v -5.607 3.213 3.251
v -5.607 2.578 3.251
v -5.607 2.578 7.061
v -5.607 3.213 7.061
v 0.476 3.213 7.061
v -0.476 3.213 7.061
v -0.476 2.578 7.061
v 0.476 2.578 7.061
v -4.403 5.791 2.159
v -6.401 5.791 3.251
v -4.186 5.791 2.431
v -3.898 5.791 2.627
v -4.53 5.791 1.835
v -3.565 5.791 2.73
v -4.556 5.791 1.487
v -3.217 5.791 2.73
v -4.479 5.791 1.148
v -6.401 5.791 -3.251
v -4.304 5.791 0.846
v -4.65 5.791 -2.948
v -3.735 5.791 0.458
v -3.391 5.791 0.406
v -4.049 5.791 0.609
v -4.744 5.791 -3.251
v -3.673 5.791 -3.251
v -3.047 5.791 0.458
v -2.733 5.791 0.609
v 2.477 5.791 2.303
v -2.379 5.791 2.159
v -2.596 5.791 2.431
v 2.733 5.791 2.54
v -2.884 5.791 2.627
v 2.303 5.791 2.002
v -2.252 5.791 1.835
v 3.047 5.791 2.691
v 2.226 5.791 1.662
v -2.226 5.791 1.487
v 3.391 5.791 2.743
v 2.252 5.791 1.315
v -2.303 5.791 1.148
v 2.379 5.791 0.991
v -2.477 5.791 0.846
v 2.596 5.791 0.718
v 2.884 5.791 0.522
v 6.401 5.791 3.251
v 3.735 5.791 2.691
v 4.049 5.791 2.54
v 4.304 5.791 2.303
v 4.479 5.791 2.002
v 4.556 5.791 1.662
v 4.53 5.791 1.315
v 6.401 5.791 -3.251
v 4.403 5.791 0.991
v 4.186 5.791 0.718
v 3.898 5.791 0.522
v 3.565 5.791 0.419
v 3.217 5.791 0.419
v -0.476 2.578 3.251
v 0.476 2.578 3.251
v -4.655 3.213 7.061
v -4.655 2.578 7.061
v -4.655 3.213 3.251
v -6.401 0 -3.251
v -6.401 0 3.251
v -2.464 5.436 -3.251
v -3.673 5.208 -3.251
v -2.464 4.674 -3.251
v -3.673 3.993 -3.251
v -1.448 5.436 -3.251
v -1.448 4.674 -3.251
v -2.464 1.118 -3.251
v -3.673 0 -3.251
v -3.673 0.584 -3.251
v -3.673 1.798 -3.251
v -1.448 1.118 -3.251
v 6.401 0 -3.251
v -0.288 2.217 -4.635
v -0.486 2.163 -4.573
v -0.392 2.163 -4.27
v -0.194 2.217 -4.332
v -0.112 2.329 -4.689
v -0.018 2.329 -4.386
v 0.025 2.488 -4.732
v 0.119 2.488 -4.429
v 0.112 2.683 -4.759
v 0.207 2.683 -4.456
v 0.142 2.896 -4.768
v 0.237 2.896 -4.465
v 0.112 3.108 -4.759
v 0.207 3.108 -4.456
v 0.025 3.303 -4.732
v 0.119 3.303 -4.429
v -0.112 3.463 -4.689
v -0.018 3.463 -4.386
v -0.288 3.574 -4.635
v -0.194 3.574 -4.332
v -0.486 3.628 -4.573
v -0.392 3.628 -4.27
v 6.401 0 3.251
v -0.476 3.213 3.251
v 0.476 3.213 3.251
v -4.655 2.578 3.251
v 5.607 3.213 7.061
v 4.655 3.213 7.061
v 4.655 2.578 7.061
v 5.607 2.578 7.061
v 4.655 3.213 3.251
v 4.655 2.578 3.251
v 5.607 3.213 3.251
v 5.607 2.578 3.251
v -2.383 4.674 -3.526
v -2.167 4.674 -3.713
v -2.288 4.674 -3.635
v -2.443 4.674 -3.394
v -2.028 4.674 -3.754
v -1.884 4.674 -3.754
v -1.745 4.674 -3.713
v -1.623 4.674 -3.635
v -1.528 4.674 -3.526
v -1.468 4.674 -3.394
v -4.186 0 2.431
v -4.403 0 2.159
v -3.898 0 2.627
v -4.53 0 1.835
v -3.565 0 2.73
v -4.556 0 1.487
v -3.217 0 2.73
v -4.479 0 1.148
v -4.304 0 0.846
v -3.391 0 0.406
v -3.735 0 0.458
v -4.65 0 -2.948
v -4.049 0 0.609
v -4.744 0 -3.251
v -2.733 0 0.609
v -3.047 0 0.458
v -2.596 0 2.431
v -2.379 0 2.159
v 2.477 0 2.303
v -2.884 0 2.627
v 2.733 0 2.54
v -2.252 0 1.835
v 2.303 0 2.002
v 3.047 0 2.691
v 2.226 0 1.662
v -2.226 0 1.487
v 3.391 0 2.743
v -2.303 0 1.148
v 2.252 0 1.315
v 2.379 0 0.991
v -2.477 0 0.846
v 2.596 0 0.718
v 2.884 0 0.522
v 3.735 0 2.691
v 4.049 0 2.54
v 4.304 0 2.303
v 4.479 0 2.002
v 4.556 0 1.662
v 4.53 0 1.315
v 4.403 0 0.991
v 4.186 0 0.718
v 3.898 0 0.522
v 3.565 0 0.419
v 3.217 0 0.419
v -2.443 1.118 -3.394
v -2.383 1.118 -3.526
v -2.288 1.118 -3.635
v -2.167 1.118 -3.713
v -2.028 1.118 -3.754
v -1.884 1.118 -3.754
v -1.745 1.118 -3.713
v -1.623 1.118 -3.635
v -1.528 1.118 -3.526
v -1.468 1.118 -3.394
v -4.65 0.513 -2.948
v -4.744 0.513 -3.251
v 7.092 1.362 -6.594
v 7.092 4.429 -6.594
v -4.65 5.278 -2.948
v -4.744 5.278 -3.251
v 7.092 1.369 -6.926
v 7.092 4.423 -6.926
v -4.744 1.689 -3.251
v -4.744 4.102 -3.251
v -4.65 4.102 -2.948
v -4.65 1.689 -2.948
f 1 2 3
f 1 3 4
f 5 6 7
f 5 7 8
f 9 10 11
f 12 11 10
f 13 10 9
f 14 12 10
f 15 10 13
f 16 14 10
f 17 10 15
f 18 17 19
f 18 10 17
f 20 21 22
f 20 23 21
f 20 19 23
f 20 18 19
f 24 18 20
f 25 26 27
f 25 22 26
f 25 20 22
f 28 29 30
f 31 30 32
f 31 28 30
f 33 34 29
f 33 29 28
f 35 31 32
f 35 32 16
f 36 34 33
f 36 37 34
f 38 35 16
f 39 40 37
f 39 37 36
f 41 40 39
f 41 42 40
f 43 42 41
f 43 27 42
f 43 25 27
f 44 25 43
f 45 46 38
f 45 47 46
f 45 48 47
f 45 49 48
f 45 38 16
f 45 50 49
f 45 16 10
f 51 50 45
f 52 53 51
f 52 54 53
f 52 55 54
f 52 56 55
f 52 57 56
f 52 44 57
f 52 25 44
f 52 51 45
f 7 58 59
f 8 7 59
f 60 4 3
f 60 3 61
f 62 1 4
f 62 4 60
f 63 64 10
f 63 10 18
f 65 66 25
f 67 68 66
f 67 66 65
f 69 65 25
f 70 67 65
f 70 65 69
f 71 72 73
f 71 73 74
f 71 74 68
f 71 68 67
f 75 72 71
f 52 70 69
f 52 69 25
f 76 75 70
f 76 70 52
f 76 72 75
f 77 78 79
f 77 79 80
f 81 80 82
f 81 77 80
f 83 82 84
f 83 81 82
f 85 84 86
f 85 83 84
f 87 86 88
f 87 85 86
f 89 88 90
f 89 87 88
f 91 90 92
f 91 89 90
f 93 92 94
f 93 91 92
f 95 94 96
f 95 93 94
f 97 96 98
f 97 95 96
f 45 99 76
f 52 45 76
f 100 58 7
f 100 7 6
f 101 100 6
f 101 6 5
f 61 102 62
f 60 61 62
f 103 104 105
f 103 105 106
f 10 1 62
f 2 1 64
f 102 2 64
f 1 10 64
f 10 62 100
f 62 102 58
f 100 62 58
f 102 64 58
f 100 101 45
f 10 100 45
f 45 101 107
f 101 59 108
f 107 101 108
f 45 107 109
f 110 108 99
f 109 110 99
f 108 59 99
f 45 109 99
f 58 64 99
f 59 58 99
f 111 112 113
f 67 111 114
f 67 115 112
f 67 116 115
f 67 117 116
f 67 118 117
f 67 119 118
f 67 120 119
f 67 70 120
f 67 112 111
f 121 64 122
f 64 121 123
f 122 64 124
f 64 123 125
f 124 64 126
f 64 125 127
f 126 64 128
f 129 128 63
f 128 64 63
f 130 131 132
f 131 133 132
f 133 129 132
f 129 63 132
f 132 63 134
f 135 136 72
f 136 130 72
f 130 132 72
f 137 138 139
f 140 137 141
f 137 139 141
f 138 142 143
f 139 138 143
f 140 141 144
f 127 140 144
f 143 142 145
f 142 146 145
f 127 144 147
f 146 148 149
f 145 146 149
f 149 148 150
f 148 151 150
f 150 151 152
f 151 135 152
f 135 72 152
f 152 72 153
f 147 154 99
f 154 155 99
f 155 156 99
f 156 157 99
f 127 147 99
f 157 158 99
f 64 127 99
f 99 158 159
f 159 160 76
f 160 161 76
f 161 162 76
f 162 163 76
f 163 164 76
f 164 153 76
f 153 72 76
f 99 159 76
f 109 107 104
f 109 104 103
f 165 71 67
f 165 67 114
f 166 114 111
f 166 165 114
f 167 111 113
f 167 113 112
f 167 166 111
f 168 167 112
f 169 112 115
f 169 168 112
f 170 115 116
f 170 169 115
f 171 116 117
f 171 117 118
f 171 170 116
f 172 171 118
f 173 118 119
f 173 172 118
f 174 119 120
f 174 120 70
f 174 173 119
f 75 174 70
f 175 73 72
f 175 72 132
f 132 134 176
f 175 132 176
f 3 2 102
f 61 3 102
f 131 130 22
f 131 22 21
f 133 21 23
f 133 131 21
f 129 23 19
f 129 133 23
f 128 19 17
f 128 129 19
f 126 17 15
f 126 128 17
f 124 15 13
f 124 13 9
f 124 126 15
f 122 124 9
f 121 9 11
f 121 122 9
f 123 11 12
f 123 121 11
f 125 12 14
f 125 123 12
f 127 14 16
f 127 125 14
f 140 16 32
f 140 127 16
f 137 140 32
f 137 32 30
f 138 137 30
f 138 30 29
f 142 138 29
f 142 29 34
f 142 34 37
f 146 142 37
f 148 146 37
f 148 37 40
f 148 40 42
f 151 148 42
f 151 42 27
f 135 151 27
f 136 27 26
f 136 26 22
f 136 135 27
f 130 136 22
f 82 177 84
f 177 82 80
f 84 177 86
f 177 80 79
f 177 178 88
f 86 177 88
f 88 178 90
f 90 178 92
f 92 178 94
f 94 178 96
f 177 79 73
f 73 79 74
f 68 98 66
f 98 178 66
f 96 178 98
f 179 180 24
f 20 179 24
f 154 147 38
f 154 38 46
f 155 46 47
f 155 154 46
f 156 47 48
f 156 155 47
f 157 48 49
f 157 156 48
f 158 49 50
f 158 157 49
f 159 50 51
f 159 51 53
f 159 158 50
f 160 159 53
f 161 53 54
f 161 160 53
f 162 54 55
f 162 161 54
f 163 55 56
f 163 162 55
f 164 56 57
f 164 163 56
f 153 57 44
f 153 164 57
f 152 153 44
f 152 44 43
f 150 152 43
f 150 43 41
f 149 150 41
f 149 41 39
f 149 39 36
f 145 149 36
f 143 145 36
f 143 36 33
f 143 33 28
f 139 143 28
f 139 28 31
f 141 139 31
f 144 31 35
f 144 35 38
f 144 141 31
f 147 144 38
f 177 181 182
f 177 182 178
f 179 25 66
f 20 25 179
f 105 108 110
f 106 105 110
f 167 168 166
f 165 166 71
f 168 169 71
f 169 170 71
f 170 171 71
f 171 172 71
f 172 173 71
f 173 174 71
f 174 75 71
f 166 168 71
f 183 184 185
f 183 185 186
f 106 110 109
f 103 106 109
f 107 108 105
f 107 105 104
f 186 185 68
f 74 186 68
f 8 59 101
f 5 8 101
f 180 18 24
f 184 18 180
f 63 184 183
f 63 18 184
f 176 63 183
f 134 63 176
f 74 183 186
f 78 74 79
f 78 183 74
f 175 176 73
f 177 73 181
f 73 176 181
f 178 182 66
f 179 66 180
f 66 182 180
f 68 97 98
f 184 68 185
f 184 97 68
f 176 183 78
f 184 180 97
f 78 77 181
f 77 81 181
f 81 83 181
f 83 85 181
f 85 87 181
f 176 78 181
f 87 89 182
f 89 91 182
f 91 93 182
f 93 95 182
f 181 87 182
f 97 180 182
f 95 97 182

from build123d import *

# Parameters (mm, degrees)
SKETCH1_W           = 12.8016
SKETCH1_H           = 6.5024
SKETCH1_R           = 1.1684
BOSS_EXTRUDE1_DEPTH = 5.7912
SKETCH2_W           = 1.016
SKETCH2_H           = 3.556
BOSS_EXTRUDE2_DEPTH = 1.27
CUT_EXTRUDE1_DEPTH  = 4.318
BOSS_EXTRUDE6_DEPTH = 5.7912
CUT_EXTRUDE2_DEPTH  = 0.3175
SKETCH7_W           = 0.9525
SKETCH7_H           = 0.635
BOSS_EXTRUDE7_DEPTH = 3.81


with BuildPart() as part:
    # Sketch1 → Boss-Extrude1 (new body)
    with BuildSketch(Plane(origin=(0, 0, 0), x_dir=(1, 0, 0), z_dir=(0, 1, 0))):
        Rectangle(SKETCH1_W, SKETCH1_H)
        with Locations(Location((3.3909, -1.5748, 0), (0, 0, 270))):
            Circle(SKETCH1_R, mode=Mode.SUBTRACT)
        with Locations(Location((-3.3909, -1.5748, 0), (0, 0, 90))):
            Circle(SKETCH1_R, mode=Mode.SUBTRACT)
    extrude(amount=BOSS_EXTRUDE1_DEPTH)

    # Sketch2 → Boss-Extrude2 (add)
    with BuildSketch(Plane(origin=(0, 0, -3.2512), x_dir=(-1, 0, 0), z_dir=(0, 0, -1))):
        with Locations((1.9558, 2.8956)):
            Rectangle(SKETCH2_W, SKETCH2_H)
    extrude(amount=BOSS_EXTRUDE2_DEPTH)

    # Sketch3 → Cut-Extrude1 (cut)
    with BuildSketch(Plane.XZ.offset(-1.1176)):
        with BuildLine():
            Line((-1.4478, -3.2512), (-1.4478, -4.5212))
            Line((-1.4478, -4.5212), (-2.4638, -4.5212))
            Line((-2.4638, -4.5212), (-2.4638, -3.2512))
            ThreePointArc((-2.4638, -3.2512), (-1.9558, -3.7592), (-1.4478, -3.2512))
        make_face()
    extrude(amount=-CUT_EXTRUDE1_DEPTH, mode=Mode.SUBTRACT)

    # Sketch4 → Boss-Extrude6 (add)
    with BuildSketch(Plane(origin=(0, 5.7912, 0), x_dir=(1, 0, 0), z_dir=(0, 1, 0))):
        Polygon((-3.673412994, 3.2512), (-4.744089172, 3.2512), (7.092310828, 6.926499891), (7.092310828, 6.594046101), align=None)
    extrude(amount=-BOSS_EXTRUDE6_DEPTH)

    # Sketch6 → Cut-Extrude2 (cut)
    with BuildSketch(Plane(origin=(-1.337930501, 0, -4.30884038), x_dir=(-0.9550199444571864, 0, 0.29654157497557215), z_dir=(-0.29654157497557215, 0, -0.9550199444571864))):
        Polygon((3.566583809, 0.512911728), (-8.82729348, 1.368515991), (-8.82729348, 0), (3.566583809, 0), align=None)
        with BuildLine():
            Line((3.566583809, 1.689384201), (-0.891541508, 2.163353626))
            ThreePointArc((-0.891541508, 2.163353626), (-1.550065164, 2.8956), (-0.891541508, 3.627846374))
            Line((-0.891541508, 3.627846374), (3.566583809, 4.101815799))
            Line((3.566583809, 4.101815799), (3.566583809, 1.689384201))
        make_face()
        Polygon((3.566583809, 5.278288272), (3.566583809, 5.7912), (-8.82729348, 5.7912), (-8.82729348, 4.422684009), align=None)
    extrude(amount=-CUT_EXTRUDE2_DEPTH, mode=Mode.SUBTRACT)

    # Sketch7 → Boss-Extrude7 (add)
    with BuildSketch(Plane.XY.offset(3.2512)):
        with Locations((-5.1308, 2.8956)):
            Rectangle(SKETCH7_W, SKETCH7_H)
        with Locations((0, 2.8956)):
            Rectangle(SKETCH7_W, SKETCH7_H)
        with Locations((5.1308, 2.8956)):
            Rectangle(SKETCH7_W, SKETCH7_H)
    extrude(amount=BOSS_EXTRUDE7_DEPTH)


solid = part.part
